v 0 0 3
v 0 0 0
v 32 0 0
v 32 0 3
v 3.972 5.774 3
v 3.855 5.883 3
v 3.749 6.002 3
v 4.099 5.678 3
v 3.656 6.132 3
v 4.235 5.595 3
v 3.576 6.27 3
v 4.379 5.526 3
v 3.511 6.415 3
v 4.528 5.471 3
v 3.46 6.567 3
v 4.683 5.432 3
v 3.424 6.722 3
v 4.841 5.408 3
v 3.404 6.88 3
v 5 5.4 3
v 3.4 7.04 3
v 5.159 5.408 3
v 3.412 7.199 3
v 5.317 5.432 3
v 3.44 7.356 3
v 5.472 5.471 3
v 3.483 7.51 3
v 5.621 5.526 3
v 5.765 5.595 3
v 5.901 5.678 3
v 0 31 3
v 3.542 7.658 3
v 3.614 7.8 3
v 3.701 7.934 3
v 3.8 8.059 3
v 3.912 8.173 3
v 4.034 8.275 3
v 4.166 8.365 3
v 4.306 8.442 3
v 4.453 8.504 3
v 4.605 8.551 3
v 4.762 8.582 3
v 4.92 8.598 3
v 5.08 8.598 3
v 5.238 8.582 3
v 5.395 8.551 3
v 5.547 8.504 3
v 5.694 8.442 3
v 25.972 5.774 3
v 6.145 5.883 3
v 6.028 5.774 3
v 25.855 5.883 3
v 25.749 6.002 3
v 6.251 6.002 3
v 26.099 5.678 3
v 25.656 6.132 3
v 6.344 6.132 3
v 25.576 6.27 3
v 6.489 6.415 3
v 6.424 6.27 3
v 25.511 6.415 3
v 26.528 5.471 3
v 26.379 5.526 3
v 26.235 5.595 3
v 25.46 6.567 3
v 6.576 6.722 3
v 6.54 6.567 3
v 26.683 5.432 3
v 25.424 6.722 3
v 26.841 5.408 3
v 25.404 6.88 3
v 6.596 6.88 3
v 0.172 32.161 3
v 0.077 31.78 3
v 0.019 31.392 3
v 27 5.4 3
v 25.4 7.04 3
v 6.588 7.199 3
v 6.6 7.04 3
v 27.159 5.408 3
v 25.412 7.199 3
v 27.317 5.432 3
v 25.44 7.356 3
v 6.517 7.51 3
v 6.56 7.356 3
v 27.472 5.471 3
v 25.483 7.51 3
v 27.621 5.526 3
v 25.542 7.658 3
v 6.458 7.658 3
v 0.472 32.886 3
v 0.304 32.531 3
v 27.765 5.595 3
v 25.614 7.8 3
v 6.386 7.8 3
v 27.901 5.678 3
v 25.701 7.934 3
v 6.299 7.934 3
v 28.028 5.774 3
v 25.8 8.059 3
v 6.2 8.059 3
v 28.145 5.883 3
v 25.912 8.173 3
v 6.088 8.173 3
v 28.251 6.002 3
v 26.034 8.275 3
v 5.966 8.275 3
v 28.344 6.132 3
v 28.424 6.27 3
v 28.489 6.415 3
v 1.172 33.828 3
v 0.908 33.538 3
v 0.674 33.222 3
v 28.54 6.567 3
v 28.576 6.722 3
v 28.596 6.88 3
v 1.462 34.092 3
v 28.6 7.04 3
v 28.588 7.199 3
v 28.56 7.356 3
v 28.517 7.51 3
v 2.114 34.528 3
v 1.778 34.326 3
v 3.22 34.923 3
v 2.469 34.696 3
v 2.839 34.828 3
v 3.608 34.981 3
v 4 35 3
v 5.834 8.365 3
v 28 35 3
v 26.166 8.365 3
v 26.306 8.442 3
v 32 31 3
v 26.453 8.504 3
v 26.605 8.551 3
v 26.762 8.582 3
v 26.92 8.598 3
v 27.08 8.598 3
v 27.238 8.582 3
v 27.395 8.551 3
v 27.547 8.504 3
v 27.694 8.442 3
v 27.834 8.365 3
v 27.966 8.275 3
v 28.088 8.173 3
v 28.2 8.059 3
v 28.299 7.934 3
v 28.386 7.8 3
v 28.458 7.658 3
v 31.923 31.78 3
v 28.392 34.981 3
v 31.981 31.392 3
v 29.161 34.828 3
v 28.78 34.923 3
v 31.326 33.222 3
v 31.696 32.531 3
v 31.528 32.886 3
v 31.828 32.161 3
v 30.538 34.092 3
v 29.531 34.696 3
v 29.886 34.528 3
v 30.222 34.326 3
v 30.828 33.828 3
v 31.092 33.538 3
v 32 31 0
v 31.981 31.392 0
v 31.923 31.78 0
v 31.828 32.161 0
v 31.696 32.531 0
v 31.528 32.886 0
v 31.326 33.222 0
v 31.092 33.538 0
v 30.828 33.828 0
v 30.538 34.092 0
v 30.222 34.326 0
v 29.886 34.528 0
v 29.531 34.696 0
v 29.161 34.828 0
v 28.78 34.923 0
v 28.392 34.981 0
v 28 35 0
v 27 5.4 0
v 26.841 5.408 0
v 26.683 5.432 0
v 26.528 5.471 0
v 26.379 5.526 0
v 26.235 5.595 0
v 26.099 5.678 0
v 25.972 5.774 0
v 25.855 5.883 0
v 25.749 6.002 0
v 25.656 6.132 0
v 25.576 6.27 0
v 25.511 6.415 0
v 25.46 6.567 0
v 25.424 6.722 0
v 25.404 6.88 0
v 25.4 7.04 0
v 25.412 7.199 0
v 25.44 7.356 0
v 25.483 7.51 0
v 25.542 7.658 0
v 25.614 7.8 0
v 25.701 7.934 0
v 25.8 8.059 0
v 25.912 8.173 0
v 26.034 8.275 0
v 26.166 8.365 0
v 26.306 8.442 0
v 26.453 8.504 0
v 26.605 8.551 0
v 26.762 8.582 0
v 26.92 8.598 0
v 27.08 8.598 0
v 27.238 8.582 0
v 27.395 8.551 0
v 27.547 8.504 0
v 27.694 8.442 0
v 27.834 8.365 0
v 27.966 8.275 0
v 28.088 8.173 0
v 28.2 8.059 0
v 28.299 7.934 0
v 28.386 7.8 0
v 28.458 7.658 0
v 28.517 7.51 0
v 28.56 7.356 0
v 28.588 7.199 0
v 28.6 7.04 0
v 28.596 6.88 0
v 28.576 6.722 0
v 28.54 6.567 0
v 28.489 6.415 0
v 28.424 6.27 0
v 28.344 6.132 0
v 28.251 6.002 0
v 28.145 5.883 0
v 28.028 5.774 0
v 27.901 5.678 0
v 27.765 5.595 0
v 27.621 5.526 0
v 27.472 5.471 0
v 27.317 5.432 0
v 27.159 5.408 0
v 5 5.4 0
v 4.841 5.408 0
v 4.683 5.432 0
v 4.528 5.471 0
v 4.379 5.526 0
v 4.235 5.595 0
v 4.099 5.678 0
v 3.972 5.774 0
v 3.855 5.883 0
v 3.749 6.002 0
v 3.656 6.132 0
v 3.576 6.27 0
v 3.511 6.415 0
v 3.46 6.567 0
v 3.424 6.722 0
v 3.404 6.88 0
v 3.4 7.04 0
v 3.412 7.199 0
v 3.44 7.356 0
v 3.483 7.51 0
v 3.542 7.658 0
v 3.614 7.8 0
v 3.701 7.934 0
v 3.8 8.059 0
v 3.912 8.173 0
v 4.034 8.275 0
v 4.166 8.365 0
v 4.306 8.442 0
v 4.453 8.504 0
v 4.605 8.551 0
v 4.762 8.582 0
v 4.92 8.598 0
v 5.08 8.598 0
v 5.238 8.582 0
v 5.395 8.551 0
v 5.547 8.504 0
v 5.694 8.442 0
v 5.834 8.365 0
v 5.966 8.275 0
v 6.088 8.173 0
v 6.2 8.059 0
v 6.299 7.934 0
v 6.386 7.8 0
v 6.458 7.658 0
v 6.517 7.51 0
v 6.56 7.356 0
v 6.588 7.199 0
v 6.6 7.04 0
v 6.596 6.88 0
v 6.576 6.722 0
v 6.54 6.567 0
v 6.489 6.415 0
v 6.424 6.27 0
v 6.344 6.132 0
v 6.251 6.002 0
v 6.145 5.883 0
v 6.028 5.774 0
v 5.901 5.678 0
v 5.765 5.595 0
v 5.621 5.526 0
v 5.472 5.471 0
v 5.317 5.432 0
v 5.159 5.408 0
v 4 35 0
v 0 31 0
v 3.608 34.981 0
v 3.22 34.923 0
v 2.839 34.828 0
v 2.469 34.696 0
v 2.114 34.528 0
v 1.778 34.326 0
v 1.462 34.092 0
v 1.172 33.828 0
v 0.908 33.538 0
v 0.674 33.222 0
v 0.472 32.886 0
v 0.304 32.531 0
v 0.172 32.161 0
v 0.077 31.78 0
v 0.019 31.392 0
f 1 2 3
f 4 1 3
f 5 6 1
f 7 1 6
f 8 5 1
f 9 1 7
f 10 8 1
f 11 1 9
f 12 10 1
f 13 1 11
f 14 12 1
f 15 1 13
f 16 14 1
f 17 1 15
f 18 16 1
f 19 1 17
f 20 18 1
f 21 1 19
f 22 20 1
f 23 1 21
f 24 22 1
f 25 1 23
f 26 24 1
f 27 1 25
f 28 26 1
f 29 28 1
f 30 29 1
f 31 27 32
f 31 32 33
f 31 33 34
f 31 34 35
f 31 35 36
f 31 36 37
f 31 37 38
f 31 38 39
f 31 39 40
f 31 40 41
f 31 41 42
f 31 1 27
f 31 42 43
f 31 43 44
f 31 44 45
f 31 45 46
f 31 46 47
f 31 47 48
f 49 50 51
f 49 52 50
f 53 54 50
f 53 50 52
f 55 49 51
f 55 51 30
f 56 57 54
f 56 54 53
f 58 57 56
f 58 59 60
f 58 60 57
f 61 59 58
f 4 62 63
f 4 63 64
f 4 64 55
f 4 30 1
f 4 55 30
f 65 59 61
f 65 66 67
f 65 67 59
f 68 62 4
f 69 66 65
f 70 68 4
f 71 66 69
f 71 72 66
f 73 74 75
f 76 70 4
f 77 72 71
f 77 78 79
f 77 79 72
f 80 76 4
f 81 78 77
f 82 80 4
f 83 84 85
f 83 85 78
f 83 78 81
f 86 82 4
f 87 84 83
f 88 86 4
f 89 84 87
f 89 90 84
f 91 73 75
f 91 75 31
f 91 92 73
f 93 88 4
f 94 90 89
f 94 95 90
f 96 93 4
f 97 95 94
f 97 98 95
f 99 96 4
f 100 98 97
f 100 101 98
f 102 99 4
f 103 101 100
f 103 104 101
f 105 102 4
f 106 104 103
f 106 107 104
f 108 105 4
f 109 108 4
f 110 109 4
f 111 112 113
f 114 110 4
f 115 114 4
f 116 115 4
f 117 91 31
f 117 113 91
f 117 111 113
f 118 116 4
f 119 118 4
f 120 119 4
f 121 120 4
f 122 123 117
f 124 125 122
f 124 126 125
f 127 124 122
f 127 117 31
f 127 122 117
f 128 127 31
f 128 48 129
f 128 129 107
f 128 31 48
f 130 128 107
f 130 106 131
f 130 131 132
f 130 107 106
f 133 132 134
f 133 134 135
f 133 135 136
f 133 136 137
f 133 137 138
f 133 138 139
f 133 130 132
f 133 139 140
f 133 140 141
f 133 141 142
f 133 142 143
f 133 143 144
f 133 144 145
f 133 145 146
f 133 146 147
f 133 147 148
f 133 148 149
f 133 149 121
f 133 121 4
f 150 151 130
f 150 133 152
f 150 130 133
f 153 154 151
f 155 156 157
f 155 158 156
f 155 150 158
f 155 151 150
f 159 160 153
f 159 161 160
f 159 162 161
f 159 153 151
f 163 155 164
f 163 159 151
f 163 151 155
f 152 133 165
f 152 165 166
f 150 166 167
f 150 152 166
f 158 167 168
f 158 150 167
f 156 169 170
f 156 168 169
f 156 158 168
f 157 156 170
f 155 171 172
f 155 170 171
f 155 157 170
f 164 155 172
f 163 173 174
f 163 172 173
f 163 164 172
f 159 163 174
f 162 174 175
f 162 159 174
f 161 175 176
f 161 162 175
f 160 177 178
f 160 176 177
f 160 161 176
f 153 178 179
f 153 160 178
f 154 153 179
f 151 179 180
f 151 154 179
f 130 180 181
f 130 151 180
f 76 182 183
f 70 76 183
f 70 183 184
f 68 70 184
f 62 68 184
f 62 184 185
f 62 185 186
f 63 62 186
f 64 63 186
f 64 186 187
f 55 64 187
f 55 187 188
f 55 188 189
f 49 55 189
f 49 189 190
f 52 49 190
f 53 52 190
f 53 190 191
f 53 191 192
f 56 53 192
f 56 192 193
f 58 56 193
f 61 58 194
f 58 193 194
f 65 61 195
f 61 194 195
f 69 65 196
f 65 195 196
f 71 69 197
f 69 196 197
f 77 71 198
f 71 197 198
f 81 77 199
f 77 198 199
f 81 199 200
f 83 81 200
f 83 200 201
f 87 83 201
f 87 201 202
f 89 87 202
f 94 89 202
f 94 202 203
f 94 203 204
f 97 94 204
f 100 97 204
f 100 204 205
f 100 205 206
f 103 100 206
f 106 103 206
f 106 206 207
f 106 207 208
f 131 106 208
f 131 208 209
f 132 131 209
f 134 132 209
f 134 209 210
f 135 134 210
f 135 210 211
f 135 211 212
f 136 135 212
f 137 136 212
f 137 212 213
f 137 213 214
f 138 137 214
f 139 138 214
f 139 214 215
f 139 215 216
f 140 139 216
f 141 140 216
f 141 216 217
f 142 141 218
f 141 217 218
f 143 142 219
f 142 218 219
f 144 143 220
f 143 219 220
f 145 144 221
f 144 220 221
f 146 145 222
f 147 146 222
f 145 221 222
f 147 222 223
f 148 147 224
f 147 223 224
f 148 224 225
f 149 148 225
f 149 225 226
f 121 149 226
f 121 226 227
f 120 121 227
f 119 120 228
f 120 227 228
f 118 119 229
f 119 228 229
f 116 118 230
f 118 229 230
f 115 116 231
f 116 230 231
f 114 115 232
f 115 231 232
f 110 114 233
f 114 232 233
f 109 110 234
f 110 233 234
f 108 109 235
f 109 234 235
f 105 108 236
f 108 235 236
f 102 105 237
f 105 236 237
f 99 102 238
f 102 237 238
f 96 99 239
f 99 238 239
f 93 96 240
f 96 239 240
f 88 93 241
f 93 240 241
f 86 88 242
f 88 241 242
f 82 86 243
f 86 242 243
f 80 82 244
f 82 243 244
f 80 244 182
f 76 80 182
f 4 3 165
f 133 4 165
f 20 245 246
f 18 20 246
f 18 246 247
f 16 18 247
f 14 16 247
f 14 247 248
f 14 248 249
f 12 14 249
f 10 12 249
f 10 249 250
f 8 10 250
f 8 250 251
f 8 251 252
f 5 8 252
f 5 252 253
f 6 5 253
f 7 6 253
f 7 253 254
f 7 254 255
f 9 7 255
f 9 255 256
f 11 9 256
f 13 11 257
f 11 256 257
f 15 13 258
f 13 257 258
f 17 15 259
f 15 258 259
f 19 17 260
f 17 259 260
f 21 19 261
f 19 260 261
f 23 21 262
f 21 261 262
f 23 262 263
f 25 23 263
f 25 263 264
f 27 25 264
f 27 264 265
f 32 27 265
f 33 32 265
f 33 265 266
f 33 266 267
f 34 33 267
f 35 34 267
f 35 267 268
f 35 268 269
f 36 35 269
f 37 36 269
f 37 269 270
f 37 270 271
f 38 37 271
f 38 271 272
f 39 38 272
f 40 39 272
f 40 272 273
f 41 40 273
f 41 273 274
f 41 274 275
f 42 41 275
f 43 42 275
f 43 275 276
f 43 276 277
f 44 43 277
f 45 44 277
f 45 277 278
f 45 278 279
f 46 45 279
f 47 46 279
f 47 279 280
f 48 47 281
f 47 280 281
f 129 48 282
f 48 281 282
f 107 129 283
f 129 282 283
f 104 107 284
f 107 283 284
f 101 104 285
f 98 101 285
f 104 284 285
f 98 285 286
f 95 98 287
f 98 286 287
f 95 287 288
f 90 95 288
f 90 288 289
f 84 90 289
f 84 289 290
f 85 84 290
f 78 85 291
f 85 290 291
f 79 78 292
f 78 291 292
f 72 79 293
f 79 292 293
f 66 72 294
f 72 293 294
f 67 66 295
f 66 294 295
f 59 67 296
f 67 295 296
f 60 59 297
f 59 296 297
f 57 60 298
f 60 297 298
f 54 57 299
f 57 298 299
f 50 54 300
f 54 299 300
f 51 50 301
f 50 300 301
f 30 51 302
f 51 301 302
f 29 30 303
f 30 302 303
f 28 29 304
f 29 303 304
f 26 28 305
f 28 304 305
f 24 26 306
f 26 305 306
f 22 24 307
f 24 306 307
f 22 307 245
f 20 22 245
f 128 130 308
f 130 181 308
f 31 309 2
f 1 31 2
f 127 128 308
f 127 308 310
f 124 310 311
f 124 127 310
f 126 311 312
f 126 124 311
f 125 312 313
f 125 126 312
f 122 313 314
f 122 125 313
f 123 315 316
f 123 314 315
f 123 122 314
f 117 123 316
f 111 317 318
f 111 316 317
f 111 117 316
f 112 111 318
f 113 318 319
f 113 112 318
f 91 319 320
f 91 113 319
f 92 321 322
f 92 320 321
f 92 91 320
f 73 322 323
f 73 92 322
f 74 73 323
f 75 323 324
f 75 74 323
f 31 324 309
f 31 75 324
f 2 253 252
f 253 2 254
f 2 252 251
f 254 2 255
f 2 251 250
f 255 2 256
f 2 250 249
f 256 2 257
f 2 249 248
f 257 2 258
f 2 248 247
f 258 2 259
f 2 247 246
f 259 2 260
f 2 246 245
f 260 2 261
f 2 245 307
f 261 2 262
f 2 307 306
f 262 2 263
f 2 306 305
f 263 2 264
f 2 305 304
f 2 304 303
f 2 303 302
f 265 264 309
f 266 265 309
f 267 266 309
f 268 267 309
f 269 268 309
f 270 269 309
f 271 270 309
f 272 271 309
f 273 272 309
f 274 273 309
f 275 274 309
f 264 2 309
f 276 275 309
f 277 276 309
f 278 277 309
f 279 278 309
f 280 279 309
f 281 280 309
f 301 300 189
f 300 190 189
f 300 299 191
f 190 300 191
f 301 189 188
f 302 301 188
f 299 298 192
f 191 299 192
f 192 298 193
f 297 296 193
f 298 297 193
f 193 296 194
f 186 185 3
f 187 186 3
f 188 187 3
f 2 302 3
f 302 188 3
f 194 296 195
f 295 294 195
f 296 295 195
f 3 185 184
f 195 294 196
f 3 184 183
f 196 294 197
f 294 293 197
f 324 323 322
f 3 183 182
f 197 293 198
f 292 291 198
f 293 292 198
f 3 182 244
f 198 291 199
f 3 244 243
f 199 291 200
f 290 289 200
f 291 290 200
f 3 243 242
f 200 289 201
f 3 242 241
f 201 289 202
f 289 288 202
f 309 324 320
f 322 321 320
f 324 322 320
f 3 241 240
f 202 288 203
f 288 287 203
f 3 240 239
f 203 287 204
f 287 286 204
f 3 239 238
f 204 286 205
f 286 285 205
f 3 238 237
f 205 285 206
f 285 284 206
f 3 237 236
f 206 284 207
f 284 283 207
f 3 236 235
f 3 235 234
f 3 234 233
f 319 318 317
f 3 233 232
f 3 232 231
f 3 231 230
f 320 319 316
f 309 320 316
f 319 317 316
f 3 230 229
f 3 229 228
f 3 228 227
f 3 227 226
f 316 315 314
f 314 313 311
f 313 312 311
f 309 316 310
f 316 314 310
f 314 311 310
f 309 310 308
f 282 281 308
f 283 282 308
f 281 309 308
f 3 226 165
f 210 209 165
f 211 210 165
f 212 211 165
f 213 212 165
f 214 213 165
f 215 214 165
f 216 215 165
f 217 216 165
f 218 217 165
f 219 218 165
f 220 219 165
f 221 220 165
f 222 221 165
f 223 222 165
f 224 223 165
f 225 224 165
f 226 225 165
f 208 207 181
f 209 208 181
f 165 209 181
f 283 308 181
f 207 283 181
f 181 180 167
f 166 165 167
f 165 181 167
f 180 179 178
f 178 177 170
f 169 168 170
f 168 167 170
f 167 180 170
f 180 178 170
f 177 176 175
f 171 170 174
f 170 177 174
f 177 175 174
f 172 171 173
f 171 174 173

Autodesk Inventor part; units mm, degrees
ref_plane "YZ Plane" through (0, 0, 0) normal (1, 0, 0) x (0, 1, 0)
ref_plane "XZ Plane" through (0, 0, 0) normal (0, 1, 0) x (-1, 0, 0)
ref_plane "XY Plane" through (0, 0, 0) normal (0, 0, 1) x (1, 0, 0)
sketch "Sketch1" plane through (0, 0, 0) normal (0, 0, 1) x (1, 0, 0)
  line L0 (0, 0) -> (32, 0)
  line L1 (32, 0) -> (32, 35)
  line L2 (32, 35) -> (0, 35)
  line L3 (0, 35) -> (0, 0)
  dimension "d0" = 32
  dimension "d1" = 35
extrude "Extrusion1" add sketch "Sketch1" along normal blind 3
sketch "Sketch2" plane through (0, 0, 3) normal (0, 0, 1) x (1, 0, 0)
  line L0 (0, 0) -> (0, 35) projected
  line L1 (32, 0) -> (0, 0) projected
  point P0 (5, 7)
  point P1 (27, 7)
  dimension "d4" = 7
  dimension "d5" = 7
  dimension "d6" = 22
  dimension "d7" = 5
hole "Hole1" at (5, 7, 3) at (27, 7, 3) direction (0, 0, -1) diameter 3.2 depth 8 tip angle 118
fillet "Fillet1" radius 4 2 edges at (32, 35, 1.5) (0, 35, 1.5)
properties part number "PLACA" material "Carbon Steel"
